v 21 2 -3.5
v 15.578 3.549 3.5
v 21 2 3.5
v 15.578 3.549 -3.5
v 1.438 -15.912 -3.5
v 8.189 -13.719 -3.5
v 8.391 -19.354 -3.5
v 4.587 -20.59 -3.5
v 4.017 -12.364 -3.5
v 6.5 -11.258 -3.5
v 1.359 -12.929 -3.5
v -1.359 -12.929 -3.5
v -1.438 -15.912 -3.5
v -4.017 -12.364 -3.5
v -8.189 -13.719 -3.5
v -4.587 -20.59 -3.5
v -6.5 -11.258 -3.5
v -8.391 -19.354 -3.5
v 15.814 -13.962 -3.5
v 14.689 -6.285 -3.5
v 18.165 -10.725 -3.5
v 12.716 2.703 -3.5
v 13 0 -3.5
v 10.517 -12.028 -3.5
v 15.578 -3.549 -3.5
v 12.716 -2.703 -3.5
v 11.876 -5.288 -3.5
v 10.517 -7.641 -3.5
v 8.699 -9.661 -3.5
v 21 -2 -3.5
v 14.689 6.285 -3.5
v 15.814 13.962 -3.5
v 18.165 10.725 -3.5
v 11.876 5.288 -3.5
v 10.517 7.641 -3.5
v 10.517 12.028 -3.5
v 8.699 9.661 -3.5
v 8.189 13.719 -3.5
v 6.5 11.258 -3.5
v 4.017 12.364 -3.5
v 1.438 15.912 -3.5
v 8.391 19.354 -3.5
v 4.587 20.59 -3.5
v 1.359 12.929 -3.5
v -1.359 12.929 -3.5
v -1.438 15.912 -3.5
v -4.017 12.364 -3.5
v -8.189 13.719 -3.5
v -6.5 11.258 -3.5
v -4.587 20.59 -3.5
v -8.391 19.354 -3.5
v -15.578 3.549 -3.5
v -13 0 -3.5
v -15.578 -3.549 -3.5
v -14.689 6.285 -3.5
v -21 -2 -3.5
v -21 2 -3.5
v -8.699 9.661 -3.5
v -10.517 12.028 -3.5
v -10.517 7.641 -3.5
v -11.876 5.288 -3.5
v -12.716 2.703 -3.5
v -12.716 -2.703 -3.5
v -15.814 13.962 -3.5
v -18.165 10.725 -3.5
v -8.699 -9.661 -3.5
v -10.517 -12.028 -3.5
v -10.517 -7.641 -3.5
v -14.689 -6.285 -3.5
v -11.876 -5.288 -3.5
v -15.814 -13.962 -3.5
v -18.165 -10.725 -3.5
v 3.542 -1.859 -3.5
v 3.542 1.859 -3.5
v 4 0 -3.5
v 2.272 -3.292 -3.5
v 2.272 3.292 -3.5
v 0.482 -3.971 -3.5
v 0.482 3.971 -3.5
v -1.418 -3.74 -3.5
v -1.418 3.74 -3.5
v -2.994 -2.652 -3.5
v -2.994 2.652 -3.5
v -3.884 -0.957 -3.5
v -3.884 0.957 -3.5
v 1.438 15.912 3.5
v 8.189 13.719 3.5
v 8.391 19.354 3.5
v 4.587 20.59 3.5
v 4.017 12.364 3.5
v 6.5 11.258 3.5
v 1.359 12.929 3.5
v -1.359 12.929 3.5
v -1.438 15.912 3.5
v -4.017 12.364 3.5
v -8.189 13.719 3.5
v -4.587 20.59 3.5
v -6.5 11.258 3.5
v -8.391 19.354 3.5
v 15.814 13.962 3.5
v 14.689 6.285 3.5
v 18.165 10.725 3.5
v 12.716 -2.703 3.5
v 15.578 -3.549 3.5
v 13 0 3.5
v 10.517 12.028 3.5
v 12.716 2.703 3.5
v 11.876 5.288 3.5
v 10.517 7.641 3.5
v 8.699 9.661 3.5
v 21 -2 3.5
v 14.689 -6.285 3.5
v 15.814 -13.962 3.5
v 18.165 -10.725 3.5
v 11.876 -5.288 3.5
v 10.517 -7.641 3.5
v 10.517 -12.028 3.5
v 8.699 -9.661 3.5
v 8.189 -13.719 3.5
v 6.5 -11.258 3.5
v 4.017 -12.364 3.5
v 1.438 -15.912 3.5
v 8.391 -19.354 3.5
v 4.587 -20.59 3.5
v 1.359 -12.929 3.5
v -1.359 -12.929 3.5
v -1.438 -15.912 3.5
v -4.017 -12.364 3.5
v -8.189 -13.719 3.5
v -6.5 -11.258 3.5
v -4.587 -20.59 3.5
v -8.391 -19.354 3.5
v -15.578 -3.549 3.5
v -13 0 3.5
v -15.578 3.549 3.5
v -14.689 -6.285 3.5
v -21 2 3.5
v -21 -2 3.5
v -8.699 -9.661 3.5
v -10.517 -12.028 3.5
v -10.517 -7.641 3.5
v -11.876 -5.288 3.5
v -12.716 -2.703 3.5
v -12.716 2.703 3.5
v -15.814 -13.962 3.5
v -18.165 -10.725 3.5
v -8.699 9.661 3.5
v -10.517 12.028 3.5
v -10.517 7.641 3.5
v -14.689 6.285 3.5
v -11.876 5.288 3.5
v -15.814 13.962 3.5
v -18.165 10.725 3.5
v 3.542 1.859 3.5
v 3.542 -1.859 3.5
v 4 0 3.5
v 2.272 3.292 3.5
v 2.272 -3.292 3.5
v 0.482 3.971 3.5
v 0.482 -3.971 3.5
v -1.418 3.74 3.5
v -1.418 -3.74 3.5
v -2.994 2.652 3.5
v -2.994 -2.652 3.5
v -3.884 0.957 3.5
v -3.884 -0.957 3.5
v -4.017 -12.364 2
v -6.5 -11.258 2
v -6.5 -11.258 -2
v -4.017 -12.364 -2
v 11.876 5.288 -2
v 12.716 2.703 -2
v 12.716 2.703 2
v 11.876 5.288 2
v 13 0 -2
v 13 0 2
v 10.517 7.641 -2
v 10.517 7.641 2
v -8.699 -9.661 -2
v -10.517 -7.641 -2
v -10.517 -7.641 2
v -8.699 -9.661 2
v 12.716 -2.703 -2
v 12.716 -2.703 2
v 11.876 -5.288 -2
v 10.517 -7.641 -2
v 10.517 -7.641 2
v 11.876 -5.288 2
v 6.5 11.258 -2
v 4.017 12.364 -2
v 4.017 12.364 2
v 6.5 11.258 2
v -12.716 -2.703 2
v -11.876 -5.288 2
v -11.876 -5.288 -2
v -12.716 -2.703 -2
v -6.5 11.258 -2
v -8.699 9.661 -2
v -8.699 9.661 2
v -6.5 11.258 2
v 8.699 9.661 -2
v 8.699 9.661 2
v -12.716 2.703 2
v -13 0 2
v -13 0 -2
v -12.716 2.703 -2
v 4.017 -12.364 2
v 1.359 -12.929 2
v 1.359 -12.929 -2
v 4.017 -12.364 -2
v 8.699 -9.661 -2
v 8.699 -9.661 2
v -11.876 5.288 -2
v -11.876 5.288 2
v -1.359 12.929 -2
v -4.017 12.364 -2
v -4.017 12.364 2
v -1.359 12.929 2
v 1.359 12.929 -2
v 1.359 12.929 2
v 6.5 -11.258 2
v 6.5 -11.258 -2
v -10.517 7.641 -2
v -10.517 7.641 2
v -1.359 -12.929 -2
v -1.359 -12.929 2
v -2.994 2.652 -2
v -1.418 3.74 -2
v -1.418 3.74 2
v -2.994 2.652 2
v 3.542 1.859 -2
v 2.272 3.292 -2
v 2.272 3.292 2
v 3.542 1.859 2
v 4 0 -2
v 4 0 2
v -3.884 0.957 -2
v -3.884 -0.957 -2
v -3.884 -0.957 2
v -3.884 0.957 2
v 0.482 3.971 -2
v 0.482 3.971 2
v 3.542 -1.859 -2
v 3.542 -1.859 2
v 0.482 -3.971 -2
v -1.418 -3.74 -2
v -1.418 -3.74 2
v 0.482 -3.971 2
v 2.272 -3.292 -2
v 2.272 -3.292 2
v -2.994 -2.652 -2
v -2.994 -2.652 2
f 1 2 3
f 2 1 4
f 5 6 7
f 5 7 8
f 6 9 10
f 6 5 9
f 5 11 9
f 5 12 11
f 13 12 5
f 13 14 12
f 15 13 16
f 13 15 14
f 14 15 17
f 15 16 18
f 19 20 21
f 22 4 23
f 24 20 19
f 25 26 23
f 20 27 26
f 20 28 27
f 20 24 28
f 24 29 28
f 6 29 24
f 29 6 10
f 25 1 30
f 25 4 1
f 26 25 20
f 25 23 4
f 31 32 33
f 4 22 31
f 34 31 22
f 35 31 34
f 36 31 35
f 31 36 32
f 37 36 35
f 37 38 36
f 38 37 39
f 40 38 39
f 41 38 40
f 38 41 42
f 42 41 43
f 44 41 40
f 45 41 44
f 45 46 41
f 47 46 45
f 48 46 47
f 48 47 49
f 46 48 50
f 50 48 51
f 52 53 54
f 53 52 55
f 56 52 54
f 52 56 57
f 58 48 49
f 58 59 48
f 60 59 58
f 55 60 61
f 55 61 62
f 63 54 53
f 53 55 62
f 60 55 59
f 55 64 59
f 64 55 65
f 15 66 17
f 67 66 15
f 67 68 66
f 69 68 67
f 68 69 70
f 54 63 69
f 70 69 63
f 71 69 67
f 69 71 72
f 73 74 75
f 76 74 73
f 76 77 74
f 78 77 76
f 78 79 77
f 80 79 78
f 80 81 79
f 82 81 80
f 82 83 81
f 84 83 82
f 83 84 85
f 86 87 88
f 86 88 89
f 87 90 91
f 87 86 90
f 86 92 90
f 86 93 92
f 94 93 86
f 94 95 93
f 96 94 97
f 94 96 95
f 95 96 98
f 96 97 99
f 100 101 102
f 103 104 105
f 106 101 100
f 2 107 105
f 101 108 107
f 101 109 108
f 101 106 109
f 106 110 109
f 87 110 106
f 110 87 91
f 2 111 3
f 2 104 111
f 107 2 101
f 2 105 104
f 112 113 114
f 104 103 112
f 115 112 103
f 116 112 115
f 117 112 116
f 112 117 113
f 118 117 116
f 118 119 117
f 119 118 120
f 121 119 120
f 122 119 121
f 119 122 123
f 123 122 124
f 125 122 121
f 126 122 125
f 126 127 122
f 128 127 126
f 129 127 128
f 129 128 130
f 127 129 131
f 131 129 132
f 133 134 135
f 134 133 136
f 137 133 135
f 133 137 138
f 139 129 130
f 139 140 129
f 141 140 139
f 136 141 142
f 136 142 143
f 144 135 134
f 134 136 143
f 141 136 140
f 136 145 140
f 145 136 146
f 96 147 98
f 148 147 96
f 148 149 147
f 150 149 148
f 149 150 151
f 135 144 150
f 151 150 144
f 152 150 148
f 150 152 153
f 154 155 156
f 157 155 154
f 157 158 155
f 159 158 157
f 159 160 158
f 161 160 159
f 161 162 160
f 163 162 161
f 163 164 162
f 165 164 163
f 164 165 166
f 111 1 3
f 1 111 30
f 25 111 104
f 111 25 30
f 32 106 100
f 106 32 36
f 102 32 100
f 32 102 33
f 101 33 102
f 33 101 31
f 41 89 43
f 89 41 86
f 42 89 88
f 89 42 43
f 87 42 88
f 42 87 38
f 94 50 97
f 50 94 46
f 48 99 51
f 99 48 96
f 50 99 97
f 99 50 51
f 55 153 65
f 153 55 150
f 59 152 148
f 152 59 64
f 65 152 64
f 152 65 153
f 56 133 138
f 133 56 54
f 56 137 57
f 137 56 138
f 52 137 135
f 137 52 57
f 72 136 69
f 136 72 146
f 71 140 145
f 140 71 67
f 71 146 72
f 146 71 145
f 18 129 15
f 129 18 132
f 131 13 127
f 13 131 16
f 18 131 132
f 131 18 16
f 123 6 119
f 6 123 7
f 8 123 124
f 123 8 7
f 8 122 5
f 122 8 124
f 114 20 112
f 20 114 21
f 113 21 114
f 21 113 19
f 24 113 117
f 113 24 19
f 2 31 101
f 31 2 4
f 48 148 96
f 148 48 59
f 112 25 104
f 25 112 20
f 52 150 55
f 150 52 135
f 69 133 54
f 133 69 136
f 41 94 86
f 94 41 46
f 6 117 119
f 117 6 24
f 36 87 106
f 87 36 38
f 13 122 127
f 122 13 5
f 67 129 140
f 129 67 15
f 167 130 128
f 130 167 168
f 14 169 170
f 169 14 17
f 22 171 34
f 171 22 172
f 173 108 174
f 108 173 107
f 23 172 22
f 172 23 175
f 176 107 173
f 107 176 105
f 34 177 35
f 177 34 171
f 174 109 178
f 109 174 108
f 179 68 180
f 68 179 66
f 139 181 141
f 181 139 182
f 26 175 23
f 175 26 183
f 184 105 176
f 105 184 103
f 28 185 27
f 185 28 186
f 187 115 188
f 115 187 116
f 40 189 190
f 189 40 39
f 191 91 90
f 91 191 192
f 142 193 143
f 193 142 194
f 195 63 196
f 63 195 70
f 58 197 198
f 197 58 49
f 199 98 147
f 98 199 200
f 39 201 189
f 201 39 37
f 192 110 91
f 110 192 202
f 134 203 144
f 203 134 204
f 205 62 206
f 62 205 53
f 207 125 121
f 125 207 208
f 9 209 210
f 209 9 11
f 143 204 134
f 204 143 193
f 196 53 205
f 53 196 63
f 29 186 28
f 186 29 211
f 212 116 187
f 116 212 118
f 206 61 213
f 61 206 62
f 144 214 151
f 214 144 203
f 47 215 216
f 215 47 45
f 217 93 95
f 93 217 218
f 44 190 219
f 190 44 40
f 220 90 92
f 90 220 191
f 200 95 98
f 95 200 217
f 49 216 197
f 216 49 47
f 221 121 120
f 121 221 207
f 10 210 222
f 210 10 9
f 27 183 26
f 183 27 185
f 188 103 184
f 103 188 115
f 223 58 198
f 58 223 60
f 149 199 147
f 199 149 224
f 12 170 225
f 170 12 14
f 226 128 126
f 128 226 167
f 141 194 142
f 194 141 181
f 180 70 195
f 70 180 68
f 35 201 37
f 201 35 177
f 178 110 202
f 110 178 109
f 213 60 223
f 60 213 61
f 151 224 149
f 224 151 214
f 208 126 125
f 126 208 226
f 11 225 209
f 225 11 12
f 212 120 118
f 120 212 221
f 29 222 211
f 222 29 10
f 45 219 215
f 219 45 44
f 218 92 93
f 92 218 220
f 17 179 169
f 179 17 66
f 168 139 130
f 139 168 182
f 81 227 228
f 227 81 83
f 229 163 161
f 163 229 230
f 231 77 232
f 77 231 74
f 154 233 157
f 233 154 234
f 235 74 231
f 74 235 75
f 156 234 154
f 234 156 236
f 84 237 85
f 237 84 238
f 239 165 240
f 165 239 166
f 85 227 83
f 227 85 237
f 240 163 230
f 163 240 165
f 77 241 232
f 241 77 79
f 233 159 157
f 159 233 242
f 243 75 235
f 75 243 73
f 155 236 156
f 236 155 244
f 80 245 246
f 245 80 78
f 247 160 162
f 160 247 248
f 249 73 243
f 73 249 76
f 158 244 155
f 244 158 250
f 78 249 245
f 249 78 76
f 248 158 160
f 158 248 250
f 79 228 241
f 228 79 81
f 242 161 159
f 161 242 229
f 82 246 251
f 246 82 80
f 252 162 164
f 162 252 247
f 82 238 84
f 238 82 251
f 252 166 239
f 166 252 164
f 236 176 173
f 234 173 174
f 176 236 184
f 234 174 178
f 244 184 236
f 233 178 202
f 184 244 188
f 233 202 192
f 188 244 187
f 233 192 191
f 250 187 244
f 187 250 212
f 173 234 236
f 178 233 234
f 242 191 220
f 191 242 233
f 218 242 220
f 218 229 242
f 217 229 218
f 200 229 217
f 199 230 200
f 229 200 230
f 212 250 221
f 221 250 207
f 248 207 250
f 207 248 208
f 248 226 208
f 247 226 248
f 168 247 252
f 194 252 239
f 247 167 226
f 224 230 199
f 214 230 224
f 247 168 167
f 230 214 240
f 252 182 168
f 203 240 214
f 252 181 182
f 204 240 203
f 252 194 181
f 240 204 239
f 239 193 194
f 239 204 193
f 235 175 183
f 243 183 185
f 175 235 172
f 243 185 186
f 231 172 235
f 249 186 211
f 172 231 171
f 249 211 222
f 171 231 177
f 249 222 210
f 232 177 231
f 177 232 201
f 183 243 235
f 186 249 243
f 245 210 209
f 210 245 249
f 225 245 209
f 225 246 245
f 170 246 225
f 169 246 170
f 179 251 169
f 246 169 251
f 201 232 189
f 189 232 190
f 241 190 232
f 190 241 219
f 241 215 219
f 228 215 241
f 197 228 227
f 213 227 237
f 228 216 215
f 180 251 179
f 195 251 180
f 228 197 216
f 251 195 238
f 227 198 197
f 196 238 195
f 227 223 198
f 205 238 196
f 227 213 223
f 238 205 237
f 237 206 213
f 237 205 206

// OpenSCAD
module Gear_02(){

    module Gear_01(){
        color("#a8b0b2")
        union(){
            cylinder(7,16,16,$fn=30,center= true);

            for (i=[0:45:359]) {
                r = 14; // pattern radius
                n = 10; // number of cars
                step = 360/n;
                for (i=[0:step:359]) {
                    angle = i;
                    dx = r*cos(angle);
                    dy = r*sin(angle);
                    translate([dx,dy,0])
                    rotate([0,0,angle])  
                    {
                 
                linear_extrude(7, scale = 1, center = true)
                polygon(points=[[0,-4],[7,-2],[7,2],[0,4]]);
                    }    
                }
            }
        }

    }
    difference(){
        Gear_01();
        color("#777777")
        difference(){
            cylinder(15,13,13, center = true);
            cylinder(15,4,4, center = true);

        }
    }
    color("#777777")
    cylinder(4,13,13, center = true);
}

Gear_02();



// Written by Nicolì Angelo (Gengio) 2024: 
// MIT License

//Permission is hereby granted, free of charge, to any person obtaining a copy of this software and associated documentation files (the "Software"), to deal in the Software without restriction, including without limitation the rights to use, copy, modify, merge, publish, distribute, sublicense, and/or sell copies of the Software, and to permit persons to whom the Software is furnished to do so, subject to the following conditions:

//The above copyright notice and this permission notice shall be included in all copies or substantial portions of the Software.

//THE SOFTWARE IS PROVIDED "AS IS", WITHOUT WARRANTY OF ANY KIND, EXPRESS OR IMPLIED, INCLUDING BUT NOT LIMITED TO THE WARRANTIES OF MERCHANTABILITY, FITNESS FOR A PARTICULAR PURPOSE AND NONINFRINGEMENT. IN NO EVENT SHALL THE AUTHORS OR COPYRIGHT HOLDERS BE LIABLE FOR ANY CLAIM, DAMAGES OR OTHER LIABILITY, WHETHER IN AN ACTION OF CONTRACT, TORT OR OTHERWISE, ARISING FROM, OUT OF OR IN CONNECTION WITH THE SOFTWARE OR THE USE OR OTHER DEALINGS IN THE SOFTWARE.
